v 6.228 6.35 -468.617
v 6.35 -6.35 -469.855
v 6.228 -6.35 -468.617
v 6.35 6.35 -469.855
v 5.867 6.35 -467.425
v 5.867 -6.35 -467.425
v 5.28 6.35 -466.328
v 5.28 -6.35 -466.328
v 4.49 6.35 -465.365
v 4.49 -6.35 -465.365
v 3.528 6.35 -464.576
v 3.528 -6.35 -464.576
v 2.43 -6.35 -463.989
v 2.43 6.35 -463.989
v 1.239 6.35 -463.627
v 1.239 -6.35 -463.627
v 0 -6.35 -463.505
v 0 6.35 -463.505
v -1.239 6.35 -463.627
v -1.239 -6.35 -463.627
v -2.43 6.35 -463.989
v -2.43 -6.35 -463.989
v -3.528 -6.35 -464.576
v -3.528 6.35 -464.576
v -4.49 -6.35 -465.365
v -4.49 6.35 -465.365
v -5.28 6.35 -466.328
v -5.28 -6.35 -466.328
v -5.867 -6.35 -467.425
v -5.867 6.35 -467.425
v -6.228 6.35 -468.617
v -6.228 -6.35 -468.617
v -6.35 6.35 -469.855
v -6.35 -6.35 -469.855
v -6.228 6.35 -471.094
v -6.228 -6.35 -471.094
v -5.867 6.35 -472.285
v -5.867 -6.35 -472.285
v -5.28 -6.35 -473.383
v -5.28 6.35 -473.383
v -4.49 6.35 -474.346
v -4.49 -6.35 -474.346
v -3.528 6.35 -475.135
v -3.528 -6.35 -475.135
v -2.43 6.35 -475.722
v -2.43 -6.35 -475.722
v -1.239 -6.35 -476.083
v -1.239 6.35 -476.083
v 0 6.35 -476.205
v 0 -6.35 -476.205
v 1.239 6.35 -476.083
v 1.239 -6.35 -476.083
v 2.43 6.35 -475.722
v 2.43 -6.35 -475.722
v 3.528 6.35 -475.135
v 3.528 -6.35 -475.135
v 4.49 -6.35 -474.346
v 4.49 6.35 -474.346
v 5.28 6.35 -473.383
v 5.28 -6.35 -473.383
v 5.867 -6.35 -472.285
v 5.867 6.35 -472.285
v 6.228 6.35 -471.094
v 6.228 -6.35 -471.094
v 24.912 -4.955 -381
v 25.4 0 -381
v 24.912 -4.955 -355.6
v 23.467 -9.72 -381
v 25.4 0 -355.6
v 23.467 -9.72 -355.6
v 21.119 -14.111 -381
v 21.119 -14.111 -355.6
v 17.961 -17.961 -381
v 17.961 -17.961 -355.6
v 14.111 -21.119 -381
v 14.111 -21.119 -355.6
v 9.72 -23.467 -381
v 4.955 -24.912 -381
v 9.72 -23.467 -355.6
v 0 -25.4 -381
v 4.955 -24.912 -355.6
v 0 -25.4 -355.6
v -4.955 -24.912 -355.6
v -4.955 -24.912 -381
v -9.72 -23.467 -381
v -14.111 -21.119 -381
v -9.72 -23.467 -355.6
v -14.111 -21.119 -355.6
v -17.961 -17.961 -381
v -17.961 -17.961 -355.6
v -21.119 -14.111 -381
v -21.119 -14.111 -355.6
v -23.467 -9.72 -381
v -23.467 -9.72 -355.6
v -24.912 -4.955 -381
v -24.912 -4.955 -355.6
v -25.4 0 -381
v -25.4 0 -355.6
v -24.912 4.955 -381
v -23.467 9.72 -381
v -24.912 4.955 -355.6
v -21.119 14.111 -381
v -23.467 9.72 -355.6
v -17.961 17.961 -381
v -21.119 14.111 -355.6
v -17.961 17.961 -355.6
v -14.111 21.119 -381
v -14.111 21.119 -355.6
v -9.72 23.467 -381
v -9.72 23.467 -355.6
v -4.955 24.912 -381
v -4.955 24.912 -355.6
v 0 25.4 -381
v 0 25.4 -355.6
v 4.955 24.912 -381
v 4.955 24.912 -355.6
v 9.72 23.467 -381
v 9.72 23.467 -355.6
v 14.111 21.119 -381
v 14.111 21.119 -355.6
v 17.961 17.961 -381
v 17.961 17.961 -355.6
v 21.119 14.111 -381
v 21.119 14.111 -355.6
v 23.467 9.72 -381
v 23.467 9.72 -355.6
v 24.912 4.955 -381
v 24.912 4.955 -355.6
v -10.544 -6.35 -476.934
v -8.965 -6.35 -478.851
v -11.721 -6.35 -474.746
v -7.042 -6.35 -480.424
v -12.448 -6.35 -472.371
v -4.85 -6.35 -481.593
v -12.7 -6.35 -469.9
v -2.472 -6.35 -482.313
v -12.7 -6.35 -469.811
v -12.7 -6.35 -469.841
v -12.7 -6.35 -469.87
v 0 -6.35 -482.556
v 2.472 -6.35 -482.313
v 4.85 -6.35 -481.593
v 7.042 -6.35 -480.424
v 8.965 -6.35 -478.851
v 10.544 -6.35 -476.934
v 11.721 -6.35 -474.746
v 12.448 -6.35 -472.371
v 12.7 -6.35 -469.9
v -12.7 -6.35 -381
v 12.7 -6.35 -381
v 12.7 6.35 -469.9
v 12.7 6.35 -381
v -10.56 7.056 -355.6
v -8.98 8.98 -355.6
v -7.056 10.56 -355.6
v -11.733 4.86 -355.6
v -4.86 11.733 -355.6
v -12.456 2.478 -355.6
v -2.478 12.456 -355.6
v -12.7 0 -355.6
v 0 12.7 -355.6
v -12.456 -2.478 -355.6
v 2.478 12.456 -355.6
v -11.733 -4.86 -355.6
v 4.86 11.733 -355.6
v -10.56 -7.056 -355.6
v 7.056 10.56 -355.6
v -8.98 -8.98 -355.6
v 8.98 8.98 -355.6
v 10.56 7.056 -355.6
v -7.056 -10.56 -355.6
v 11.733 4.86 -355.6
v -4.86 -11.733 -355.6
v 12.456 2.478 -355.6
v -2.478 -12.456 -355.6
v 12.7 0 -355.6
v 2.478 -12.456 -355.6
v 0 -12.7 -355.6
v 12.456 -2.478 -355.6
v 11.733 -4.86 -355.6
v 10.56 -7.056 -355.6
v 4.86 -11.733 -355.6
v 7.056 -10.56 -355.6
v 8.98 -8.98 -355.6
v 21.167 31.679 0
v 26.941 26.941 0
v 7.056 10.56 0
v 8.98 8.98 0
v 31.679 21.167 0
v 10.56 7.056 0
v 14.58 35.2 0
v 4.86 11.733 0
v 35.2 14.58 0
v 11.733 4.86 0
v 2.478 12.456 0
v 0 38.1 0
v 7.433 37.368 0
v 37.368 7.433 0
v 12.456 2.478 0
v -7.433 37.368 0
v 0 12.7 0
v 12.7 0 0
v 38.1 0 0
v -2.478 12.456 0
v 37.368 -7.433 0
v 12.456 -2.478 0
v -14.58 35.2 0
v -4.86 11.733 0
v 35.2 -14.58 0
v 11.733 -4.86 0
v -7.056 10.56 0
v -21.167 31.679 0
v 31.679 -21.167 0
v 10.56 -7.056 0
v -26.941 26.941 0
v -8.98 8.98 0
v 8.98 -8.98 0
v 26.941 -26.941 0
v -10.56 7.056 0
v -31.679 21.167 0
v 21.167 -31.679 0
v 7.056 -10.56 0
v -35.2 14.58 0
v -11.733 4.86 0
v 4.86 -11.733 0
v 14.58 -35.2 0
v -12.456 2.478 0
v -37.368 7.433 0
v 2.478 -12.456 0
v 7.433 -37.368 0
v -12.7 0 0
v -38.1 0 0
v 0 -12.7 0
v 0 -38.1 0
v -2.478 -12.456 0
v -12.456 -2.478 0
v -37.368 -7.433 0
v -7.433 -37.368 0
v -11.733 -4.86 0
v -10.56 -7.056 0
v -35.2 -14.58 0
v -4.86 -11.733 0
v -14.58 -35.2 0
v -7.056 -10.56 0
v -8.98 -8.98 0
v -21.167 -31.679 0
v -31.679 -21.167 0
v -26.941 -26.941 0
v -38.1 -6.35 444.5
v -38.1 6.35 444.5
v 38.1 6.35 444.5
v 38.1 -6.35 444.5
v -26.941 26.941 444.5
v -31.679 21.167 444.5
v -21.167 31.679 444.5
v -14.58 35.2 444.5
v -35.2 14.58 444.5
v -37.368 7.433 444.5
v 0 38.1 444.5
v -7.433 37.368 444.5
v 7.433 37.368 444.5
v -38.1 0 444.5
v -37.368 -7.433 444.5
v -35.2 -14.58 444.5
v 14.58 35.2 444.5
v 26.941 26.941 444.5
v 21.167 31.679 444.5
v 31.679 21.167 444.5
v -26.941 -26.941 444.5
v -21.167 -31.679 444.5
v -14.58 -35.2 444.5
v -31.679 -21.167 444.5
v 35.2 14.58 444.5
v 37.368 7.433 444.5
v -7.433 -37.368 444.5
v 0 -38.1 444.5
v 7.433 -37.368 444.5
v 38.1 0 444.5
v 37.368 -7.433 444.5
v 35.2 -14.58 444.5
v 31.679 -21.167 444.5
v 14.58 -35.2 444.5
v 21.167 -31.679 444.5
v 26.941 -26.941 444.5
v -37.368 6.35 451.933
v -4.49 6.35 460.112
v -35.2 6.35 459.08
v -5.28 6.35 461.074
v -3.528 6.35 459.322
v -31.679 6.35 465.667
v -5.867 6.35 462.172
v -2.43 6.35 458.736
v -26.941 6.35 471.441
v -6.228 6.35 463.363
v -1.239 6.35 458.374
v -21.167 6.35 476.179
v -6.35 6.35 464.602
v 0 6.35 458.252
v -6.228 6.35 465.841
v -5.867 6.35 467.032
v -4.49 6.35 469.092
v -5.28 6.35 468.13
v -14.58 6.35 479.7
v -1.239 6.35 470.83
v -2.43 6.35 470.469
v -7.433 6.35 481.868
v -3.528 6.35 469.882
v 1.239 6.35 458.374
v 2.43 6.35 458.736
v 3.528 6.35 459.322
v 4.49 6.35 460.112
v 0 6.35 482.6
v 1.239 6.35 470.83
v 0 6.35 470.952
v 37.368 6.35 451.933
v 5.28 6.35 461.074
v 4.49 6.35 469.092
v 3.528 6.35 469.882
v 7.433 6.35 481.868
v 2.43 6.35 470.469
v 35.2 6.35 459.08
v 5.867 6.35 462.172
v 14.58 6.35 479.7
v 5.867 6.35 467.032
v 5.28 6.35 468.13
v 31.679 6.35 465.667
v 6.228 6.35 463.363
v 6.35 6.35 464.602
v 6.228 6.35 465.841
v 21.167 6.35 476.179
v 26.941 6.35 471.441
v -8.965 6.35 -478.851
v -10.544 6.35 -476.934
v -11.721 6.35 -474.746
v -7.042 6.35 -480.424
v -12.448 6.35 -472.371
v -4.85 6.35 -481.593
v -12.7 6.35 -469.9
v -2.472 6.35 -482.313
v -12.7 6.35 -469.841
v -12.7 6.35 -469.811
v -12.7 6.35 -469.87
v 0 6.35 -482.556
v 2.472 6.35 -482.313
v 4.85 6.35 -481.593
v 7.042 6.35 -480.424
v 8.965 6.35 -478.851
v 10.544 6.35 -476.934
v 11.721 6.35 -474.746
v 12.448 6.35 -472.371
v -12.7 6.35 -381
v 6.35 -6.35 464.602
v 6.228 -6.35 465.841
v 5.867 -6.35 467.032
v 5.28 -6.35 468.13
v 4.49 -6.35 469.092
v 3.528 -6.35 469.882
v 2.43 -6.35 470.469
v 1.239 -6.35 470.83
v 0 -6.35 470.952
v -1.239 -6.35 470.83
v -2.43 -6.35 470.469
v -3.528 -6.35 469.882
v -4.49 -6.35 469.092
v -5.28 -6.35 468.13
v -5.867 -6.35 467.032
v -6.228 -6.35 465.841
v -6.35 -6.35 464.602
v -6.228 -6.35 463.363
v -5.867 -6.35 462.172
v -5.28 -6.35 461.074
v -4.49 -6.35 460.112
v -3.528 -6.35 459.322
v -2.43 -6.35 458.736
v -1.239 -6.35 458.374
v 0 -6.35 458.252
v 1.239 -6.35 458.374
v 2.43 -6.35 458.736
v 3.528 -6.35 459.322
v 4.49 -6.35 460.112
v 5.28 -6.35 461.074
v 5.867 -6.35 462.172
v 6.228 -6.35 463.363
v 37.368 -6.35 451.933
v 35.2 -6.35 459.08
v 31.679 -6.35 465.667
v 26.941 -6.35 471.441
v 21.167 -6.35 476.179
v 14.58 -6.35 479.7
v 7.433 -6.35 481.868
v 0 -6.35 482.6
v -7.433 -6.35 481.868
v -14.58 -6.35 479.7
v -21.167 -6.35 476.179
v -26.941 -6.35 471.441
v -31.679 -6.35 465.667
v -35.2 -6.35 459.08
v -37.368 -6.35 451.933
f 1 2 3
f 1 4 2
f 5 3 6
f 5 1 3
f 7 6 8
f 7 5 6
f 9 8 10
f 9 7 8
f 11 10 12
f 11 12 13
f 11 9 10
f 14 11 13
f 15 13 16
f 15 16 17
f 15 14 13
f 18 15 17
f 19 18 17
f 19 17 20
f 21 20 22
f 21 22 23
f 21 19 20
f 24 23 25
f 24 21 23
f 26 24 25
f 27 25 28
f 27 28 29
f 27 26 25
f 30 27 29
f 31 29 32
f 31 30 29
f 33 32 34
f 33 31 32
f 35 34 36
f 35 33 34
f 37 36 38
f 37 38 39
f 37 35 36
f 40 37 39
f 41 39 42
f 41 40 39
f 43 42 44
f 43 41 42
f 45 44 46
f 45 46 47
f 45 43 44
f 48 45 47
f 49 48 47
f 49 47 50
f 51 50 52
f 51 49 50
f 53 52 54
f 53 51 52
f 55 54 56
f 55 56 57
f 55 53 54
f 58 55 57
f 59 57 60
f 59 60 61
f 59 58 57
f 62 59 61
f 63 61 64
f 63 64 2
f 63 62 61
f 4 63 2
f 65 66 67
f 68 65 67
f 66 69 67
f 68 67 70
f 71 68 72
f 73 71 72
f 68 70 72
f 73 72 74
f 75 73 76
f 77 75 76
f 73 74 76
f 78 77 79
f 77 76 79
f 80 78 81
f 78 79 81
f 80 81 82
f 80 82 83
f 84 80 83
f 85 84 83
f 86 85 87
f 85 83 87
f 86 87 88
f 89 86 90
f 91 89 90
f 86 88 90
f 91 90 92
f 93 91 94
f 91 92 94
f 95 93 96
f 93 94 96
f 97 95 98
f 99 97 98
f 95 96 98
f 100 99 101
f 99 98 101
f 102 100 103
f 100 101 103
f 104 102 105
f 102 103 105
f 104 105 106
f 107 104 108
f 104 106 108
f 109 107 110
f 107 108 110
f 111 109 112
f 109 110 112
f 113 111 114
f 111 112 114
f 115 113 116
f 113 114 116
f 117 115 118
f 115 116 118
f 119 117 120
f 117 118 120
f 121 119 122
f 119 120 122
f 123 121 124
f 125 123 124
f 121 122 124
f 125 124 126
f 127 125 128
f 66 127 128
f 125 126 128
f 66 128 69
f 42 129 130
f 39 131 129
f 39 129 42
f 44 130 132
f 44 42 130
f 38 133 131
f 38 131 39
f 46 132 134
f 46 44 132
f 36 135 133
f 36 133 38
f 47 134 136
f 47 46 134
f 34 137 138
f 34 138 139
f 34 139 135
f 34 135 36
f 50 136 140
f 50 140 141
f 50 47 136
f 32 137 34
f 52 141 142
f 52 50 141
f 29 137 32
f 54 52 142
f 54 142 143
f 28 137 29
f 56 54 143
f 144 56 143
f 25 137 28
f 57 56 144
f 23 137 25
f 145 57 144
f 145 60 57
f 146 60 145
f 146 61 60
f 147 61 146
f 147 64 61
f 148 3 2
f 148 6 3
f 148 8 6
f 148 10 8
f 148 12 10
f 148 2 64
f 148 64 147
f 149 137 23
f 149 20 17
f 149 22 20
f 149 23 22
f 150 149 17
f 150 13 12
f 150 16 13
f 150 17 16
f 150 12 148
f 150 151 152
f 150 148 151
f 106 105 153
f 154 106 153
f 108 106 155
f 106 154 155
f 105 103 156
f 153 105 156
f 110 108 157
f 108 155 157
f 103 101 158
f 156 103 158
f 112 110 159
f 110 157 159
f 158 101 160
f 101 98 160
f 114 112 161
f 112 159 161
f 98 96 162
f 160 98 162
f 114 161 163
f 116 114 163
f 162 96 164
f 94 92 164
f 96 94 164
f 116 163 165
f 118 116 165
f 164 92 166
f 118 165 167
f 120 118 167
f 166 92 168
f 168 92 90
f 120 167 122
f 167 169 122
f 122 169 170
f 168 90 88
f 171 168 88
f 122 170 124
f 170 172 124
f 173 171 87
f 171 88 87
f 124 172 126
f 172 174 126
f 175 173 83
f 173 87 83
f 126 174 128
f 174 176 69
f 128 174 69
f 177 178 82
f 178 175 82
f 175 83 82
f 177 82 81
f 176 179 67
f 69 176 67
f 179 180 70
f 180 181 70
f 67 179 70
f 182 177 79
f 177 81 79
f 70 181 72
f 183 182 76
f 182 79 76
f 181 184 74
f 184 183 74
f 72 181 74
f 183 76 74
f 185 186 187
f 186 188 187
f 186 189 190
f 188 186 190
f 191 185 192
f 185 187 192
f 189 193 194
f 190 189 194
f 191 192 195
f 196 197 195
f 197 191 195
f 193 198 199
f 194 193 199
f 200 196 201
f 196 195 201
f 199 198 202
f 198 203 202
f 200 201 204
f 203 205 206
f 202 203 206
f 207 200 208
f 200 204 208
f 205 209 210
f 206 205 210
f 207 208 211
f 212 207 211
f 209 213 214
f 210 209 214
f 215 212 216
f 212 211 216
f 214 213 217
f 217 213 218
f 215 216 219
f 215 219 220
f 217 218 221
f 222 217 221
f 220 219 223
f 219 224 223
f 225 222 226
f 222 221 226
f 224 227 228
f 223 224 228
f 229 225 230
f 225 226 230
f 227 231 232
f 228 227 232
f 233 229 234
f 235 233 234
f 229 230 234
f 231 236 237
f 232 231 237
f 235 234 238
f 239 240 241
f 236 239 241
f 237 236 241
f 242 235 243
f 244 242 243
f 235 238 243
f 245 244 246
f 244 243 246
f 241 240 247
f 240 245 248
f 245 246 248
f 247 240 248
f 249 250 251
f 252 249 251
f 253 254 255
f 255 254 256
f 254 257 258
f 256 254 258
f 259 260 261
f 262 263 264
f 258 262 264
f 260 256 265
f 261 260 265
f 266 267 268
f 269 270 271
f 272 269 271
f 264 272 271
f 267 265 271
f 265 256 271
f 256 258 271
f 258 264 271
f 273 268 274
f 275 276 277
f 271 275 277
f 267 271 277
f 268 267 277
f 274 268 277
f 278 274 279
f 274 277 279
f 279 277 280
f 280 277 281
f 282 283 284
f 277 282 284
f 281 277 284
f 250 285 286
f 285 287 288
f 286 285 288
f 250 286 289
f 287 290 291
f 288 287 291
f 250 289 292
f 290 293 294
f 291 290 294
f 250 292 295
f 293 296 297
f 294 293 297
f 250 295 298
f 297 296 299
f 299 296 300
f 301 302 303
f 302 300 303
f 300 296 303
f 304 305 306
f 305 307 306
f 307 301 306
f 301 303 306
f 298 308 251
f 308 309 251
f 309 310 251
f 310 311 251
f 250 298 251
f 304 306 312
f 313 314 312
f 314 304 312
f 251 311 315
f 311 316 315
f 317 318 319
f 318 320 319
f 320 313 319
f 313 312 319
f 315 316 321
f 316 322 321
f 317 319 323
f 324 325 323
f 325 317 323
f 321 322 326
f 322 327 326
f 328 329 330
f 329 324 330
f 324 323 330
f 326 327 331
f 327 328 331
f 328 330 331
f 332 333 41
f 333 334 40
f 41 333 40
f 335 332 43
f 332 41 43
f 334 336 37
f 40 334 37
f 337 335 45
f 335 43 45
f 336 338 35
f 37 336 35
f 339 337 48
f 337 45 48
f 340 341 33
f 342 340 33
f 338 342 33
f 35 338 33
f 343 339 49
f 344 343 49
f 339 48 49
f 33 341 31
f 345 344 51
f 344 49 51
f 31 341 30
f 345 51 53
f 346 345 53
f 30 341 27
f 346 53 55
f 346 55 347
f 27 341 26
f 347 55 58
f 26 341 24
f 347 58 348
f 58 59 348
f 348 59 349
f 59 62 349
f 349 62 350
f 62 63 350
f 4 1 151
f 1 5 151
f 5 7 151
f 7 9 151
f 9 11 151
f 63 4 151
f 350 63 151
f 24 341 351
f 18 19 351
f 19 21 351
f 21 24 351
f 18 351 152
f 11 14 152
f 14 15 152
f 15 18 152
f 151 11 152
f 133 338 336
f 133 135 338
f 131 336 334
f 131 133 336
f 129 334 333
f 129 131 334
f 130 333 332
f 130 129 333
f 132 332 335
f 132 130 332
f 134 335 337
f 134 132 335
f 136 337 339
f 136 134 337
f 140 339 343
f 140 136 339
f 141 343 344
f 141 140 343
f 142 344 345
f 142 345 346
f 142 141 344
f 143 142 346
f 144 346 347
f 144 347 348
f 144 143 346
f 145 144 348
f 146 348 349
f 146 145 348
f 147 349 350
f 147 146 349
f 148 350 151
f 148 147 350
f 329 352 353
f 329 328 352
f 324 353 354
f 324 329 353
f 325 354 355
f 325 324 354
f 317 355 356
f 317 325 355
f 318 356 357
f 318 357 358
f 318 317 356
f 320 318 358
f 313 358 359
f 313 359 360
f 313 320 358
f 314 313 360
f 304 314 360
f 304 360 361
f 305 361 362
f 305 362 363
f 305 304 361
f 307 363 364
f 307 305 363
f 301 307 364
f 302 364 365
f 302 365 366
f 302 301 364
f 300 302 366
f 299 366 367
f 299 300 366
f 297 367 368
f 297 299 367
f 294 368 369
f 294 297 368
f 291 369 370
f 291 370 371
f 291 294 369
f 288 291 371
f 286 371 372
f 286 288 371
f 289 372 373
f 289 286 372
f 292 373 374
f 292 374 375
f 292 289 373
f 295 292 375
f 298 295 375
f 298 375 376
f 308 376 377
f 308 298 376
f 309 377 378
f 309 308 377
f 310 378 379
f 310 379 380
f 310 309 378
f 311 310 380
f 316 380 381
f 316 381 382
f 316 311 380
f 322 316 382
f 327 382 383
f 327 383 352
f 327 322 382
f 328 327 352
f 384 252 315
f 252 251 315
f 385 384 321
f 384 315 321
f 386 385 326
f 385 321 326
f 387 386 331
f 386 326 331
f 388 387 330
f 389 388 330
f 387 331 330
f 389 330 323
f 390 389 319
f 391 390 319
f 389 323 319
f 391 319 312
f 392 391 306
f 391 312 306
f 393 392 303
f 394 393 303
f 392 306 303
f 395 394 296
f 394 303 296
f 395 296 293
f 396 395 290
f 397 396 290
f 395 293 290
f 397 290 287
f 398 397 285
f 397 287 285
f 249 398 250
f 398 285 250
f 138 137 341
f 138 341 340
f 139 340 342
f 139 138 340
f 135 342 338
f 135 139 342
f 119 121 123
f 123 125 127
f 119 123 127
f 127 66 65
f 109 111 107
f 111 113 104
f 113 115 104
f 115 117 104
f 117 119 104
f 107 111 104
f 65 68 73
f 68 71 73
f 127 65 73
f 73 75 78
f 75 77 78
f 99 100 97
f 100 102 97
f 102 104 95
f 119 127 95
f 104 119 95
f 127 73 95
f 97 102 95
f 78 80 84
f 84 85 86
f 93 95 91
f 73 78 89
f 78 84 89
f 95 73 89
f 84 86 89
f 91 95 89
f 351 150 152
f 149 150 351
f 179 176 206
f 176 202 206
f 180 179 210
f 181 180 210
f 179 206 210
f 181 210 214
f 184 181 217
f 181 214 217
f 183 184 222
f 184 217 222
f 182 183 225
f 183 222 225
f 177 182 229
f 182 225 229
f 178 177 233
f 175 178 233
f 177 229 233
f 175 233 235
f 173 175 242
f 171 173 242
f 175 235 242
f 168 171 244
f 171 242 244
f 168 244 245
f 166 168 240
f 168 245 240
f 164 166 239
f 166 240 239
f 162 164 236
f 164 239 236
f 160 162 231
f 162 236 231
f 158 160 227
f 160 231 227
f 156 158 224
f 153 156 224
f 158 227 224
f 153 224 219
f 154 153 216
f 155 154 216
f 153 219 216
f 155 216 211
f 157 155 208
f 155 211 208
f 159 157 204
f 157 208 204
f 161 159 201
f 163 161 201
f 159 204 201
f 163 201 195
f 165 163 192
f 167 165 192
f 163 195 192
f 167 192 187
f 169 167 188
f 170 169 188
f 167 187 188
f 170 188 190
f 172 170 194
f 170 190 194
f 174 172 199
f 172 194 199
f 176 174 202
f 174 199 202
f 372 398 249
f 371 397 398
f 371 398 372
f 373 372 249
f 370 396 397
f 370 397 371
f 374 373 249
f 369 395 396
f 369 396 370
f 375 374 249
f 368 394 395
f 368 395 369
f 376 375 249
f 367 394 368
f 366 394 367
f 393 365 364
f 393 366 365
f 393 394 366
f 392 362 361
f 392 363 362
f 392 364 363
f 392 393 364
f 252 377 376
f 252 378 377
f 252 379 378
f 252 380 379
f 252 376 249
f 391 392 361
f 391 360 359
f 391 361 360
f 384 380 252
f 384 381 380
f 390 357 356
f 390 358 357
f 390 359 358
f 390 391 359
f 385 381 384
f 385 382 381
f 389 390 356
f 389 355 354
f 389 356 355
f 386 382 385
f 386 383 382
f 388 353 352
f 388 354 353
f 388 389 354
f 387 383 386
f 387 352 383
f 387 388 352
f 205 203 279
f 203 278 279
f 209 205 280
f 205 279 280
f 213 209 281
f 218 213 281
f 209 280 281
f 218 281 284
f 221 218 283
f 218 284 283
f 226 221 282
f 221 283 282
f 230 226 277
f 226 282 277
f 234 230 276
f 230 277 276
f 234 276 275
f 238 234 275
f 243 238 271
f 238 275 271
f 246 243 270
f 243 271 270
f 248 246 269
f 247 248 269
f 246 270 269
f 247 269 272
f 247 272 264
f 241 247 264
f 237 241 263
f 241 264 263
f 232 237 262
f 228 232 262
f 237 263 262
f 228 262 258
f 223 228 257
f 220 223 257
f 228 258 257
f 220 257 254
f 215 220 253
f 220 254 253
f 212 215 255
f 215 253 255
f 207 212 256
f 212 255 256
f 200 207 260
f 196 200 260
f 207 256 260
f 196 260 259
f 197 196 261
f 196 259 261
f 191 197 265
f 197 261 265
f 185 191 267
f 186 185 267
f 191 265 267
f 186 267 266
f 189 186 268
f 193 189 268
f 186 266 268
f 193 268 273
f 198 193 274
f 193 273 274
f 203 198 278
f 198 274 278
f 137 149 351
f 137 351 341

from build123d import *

# Parameters (mm, degrees)
F0_R     = 6.35
F1_DEPTH = 6.35
F0_W     = 12.7
F0_H     = 355.6


with BuildPart() as f1:
    # F0 (on Front) → F1 (new body, symmetric)
    with BuildSketch(Plane.XZ):
        with BuildLine():
            Line((-38.1, 444.5), (0, 444.5))
            Line((0, 444.5), (38.1, 444.5))
            ThreePointArc((38.1, 444.5), (0, 482.6), (-38.1, 444.5))
        make_face()
        with Locations((0, 464.602202)):
            Circle(F0_R, mode=Mode.SUBTRACT)
        with BuildLine():
            Line((12.7, -381), (0, -381))
            Line((0, -381), (-12.7, -381))
            Line((-12.7, -381), (-12.7, -469.810855))
            ThreePointArc((-12.7, -469.810855), (-12.700078, -469.855428), (-12.7, -469.9))
            ThreePointArc((-12.7, -469.9), (0, -482.555506), (12.7, -469.9))
            Line((12.7, -469.9), (12.7, -469.810855))
            Line((12.7, -469.810855), (12.7, -381))
        make_face()
        with Locations((0, -469.855428)):
            Circle(F0_R, mode=Mode.SUBTRACT)
    extrude(amount=F1_DEPTH, both=True)


with BuildPart() as f2:
    # F0 (on Front) → F2 (revolve)
    with BuildSketch(Plane.XZ):
        Polygon((0, 444.5), (0, 0), (12.7, 0), (38.1, 0), (38.1, 444.5), align=None)
        with Locations((6.35, -177.8)):
            Rectangle(F0_W, F0_H)
        Polygon((12.7, -355.6), (0, -355.6), (0, -381), (12.7, -381), (25.4, -381), (25.4, -355.6), align=None)
    revolve(axis=Axis((0, 0, -368.3), (0, 0, -1)))


solid = Compound([f1.part, f2.part])
